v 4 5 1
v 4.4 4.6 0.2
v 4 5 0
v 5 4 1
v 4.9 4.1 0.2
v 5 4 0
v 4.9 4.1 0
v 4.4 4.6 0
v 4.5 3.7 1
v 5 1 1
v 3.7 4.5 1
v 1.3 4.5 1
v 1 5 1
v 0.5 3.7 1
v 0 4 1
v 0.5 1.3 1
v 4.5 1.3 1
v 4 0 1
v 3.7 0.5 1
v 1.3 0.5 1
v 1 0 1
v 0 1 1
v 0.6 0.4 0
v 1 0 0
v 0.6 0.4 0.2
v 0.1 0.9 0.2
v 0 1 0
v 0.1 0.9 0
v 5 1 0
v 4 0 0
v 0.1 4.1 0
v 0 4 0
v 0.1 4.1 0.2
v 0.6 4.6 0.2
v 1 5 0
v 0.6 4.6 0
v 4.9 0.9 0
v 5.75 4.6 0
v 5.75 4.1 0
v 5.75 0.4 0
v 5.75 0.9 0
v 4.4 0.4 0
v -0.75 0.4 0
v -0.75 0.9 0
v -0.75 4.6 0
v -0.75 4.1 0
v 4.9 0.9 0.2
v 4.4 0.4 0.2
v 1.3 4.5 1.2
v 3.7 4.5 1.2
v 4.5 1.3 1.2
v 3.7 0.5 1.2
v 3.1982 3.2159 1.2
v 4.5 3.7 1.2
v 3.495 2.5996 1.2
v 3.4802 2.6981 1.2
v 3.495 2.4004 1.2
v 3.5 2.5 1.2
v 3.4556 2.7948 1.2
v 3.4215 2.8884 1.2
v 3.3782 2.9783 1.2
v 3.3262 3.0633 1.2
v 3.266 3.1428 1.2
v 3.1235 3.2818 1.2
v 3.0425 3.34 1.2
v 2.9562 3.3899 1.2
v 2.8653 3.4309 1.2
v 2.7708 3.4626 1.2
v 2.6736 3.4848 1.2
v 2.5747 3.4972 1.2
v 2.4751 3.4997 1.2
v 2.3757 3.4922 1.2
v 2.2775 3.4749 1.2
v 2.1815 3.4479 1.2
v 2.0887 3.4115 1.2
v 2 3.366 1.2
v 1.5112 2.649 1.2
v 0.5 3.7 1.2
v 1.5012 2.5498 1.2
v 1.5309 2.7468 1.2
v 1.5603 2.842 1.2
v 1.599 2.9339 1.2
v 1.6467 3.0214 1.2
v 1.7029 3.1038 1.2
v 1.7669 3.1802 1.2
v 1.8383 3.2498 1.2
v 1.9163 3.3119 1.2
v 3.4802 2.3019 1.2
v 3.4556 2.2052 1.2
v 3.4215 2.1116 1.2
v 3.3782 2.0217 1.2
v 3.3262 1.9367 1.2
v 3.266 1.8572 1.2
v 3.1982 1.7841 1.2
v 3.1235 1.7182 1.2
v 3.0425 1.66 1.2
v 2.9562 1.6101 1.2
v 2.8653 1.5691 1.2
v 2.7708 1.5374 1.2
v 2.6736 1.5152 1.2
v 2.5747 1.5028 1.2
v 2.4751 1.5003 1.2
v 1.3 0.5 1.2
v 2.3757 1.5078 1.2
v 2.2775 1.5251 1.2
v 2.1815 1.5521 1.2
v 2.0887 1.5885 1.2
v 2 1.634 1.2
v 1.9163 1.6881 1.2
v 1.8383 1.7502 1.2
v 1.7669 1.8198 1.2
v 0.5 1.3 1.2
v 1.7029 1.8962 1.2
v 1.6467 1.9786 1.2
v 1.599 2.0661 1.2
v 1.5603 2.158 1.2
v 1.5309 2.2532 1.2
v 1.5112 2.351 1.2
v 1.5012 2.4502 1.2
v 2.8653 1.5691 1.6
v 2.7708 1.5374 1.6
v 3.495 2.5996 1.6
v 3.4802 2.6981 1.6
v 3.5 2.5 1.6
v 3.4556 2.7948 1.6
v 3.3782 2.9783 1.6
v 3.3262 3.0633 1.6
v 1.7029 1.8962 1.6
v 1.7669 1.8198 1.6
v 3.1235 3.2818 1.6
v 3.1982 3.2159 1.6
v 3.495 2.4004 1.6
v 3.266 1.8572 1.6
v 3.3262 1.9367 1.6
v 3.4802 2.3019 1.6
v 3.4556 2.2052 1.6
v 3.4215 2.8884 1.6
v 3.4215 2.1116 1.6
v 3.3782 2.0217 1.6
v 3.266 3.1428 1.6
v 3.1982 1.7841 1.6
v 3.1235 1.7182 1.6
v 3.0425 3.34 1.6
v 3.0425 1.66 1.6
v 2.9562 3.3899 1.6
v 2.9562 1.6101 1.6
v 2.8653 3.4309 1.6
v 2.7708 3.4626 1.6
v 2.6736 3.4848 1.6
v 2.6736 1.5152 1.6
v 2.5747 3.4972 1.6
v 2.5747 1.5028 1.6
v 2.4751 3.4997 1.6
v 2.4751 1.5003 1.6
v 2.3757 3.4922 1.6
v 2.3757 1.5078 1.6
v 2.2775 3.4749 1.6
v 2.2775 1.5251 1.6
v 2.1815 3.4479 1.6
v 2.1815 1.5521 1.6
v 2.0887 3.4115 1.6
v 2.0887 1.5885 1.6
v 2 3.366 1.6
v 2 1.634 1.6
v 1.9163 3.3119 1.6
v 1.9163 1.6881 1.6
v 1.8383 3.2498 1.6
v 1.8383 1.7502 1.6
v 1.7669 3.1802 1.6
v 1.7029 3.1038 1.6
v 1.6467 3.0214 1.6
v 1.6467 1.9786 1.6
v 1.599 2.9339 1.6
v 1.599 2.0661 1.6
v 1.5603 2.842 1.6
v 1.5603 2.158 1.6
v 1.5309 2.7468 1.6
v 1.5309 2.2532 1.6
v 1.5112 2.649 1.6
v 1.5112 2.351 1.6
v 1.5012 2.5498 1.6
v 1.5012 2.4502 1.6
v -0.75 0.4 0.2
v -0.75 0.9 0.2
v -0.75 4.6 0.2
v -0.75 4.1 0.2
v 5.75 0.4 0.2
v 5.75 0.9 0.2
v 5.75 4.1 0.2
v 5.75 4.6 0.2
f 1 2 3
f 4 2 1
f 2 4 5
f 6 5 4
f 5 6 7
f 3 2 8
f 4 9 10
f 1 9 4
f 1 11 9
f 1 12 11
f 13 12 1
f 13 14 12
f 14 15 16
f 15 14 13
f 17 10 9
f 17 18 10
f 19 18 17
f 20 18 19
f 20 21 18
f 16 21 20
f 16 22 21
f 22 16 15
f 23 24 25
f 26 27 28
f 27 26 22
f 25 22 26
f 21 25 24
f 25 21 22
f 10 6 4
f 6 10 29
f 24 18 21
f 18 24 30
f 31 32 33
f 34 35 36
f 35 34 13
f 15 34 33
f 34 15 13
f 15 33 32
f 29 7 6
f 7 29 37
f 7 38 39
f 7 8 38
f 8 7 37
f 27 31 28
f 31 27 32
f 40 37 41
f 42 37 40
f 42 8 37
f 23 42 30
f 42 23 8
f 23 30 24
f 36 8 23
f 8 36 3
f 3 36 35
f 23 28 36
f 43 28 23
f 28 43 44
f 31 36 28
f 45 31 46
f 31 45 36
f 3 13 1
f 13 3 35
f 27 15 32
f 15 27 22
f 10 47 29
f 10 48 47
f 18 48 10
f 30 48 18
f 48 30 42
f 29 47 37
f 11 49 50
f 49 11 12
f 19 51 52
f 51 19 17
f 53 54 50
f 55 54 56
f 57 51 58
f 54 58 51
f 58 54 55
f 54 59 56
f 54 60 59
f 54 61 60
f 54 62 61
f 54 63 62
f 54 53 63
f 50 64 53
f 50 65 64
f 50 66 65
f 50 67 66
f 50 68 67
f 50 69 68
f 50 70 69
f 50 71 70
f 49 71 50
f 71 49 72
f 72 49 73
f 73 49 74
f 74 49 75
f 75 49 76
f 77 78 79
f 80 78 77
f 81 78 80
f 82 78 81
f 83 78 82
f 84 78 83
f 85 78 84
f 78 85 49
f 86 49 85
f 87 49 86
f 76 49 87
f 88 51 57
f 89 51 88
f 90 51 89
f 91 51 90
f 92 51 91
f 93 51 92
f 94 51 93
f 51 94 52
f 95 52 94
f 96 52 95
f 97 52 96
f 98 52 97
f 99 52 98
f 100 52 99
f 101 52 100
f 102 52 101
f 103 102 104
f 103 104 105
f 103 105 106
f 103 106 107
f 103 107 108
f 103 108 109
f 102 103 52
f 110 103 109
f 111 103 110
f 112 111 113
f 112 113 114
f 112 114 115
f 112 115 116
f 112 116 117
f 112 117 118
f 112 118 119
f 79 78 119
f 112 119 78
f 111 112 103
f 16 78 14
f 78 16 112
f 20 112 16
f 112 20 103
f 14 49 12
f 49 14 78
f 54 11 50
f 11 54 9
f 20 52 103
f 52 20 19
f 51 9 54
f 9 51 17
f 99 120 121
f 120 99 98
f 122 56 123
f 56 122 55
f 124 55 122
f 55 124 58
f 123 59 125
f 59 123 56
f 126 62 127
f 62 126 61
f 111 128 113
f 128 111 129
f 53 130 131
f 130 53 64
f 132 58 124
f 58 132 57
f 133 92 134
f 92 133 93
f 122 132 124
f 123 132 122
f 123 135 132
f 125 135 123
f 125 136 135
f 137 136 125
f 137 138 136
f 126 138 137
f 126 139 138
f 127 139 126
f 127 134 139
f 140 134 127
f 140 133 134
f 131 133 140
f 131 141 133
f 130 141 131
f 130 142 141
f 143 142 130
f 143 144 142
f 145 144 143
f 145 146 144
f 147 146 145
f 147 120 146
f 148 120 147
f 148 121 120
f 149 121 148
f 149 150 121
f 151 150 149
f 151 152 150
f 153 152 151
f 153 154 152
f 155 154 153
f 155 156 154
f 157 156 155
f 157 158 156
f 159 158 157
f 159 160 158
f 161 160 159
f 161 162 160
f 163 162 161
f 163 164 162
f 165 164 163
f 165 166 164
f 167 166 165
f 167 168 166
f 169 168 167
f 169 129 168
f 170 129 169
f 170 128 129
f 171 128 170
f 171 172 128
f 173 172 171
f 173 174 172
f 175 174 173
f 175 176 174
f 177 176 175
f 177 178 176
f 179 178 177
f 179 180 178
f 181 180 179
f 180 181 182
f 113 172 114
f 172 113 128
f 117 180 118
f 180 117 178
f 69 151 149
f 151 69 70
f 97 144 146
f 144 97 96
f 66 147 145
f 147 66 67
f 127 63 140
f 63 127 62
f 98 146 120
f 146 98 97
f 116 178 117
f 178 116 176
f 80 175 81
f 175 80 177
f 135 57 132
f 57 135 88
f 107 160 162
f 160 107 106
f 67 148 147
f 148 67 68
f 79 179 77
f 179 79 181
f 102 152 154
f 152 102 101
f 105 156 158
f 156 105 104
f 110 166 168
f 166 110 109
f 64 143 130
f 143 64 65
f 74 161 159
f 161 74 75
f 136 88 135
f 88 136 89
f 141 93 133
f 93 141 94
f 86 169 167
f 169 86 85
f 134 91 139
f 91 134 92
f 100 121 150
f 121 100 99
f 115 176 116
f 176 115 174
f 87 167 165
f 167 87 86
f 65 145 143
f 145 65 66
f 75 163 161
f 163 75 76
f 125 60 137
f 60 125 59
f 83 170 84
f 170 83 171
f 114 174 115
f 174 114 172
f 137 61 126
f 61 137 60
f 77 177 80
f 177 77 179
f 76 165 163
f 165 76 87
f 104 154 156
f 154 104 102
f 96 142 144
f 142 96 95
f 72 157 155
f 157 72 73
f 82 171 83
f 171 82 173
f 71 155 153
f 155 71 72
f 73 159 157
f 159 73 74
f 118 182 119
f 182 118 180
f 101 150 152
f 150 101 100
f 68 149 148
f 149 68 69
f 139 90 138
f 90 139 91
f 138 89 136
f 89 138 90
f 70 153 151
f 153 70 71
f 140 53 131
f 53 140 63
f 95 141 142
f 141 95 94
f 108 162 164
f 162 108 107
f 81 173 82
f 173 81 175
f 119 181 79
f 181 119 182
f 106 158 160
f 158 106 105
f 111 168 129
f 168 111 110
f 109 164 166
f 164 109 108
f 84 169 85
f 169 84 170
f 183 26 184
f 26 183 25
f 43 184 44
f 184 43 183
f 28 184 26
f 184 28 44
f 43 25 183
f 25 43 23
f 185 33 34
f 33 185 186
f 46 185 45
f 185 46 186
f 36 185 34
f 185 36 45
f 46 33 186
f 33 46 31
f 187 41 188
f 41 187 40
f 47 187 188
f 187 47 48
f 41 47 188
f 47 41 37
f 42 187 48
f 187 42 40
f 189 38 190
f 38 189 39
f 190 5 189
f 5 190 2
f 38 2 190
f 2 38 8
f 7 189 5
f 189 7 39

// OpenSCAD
/*
 * 4x4H1.6.scad - 3D Pushbutton Switch for Kicad
 * 
 * Copyright (C) 2015 Theophilus
 *
 * osab
 *
 * License: Matthew 10:8b - "freely ye have received, freely give."
 *
 * Use this information at your own risk.
 *
 */

$fa=0.1; // default minimum facet angle is now 0.1
$fs=0.1; // default minimum facet size is now 0.1 mm

module pin() {
	cube([1.5,0.5,0.2]);
}

linear_extrude(height=1)
polygon([[0,1],[1,0],[4,0],[5,1],[5,4],[4,5],[1,5],[0,4]]);

translate([0.5,0.5,1])
linear_extrude(height=0.2)
polygon([[0,4/5*1],[4/5*1,0],[4/5*4,0],[4/5*5,4/5*1],[4/5*5,4/5*4],[4/5*4,4/5*5],[4/5*1,4/5*5],[0,4/5*4]]);

translate([2.5,2.5,1.2])
cylinder(h=0.4, d=2);

translate([-0.75,0.4,0])
pin();

translate([-0.75,4.1,0])
pin();

translate([4.25,0.4,0])
pin();

translate([4.25,4.1,0])
pin();
